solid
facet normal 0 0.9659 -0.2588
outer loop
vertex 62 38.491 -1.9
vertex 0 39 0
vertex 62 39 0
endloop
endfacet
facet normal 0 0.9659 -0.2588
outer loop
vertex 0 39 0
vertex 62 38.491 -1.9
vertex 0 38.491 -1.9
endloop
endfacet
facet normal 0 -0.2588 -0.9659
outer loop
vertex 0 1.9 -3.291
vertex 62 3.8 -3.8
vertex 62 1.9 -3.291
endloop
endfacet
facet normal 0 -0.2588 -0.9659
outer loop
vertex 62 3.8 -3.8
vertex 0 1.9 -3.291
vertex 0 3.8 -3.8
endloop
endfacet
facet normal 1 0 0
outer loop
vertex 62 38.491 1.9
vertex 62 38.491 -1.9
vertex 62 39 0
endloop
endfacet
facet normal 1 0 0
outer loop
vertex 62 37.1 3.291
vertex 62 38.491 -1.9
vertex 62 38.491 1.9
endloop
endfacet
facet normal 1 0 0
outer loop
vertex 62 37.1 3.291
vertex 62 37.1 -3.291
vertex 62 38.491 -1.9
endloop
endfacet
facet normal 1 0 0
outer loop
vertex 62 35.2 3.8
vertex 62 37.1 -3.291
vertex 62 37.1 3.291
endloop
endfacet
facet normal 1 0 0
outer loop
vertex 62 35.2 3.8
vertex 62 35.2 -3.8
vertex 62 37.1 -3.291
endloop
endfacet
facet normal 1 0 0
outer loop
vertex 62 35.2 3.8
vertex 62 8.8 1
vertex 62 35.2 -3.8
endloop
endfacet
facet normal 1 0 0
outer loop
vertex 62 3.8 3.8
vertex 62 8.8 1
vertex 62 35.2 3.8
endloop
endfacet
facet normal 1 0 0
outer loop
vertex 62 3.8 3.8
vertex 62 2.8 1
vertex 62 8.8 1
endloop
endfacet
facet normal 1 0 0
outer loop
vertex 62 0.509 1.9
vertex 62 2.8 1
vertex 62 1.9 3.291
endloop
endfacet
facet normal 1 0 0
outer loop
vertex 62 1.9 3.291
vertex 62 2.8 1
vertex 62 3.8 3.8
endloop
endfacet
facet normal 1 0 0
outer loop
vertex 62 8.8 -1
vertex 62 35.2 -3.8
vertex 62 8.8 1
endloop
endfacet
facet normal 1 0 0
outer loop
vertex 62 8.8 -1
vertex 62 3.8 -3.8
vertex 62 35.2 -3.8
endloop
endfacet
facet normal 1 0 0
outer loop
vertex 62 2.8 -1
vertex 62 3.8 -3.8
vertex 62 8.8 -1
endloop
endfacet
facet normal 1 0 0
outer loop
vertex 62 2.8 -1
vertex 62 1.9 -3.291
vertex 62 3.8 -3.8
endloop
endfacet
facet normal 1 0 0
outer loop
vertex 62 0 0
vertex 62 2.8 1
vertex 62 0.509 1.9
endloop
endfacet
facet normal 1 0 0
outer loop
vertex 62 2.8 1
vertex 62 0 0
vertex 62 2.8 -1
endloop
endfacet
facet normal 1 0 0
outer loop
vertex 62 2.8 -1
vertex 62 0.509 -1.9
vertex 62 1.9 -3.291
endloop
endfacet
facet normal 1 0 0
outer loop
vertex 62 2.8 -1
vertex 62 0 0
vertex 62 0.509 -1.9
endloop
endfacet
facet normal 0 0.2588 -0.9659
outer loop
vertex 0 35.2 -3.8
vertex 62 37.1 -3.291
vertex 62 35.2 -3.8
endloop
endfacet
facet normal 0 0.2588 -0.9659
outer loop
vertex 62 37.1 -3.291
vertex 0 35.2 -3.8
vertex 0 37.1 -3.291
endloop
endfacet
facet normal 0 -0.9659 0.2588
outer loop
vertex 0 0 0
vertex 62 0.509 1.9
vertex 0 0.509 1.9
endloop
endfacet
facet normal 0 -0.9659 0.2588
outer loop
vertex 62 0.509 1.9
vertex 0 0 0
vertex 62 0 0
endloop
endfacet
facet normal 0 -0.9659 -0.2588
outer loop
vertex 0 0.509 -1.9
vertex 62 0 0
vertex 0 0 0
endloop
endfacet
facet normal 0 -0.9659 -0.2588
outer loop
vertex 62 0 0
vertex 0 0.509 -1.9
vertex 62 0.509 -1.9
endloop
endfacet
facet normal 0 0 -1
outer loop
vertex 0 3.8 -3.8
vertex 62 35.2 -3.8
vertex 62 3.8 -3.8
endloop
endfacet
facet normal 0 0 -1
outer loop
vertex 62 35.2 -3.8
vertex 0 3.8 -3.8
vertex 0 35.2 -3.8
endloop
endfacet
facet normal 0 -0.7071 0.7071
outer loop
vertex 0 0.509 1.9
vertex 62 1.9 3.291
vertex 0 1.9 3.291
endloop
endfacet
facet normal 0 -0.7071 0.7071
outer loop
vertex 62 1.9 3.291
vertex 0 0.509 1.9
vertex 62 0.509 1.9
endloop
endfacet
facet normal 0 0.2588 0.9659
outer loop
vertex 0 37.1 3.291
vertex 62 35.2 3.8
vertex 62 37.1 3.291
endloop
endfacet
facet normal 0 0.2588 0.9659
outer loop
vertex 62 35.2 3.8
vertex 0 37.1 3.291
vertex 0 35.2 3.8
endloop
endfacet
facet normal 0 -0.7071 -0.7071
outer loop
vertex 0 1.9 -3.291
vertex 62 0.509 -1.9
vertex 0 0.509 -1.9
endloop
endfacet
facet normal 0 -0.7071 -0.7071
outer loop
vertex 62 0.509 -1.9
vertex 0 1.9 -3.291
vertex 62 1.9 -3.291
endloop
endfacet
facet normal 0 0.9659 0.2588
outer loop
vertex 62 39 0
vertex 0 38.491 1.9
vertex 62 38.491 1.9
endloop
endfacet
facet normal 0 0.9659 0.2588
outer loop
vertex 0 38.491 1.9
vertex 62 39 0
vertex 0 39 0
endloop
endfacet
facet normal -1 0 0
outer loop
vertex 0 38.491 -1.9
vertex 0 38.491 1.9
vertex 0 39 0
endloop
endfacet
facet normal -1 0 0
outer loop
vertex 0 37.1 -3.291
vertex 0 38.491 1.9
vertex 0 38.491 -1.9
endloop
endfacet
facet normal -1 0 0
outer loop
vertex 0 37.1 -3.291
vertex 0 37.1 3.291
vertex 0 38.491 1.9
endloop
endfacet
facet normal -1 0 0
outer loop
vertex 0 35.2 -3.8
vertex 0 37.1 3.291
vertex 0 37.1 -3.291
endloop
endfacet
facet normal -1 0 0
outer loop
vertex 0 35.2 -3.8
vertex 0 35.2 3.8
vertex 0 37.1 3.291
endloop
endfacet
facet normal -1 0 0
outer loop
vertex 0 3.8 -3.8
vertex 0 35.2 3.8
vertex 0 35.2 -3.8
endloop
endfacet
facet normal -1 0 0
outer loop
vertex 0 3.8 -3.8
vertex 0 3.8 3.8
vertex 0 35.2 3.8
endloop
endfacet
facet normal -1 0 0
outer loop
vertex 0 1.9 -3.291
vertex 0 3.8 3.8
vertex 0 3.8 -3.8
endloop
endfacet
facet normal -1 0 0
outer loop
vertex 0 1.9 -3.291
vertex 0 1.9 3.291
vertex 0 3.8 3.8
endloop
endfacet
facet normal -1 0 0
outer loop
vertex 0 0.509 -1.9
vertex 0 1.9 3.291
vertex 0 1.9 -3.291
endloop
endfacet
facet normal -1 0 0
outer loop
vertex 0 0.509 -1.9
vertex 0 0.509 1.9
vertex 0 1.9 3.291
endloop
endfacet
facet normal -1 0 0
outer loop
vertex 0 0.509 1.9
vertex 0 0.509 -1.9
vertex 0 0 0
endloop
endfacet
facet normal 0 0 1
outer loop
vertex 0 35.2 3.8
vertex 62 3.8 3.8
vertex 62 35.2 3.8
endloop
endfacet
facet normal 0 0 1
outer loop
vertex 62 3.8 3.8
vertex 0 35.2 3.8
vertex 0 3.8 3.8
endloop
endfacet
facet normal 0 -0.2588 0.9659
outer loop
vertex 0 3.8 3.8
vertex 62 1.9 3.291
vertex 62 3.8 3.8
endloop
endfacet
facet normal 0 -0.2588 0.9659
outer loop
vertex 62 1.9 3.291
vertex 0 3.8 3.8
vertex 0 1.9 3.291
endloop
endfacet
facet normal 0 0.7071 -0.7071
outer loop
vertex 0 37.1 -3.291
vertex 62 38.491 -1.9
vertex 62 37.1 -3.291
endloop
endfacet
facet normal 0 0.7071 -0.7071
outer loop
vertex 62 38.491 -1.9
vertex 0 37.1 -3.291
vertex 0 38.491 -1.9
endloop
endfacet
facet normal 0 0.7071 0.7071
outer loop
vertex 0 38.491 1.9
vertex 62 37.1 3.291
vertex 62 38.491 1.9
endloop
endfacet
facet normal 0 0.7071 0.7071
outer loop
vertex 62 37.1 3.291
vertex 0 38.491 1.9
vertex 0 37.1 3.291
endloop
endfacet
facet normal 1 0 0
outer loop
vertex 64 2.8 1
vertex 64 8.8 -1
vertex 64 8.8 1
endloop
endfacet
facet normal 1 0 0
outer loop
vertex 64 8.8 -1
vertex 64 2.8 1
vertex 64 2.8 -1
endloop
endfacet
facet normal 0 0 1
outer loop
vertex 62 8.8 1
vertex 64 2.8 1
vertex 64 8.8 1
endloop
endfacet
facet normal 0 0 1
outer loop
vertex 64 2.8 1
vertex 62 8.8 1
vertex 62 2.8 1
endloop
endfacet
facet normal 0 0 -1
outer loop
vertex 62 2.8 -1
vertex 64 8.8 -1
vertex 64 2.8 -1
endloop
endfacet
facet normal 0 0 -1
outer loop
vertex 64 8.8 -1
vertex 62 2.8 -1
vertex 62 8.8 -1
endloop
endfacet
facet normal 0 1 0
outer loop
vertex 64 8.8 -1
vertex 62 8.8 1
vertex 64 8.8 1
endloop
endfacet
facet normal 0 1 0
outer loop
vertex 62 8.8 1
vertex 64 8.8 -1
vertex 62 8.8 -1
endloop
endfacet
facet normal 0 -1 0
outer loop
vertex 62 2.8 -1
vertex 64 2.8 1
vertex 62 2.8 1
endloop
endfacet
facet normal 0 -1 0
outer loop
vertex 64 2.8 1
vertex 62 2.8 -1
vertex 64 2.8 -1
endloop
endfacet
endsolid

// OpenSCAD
W = 62;
H = 39;
T = 7.6;

module battery() {
  color("#566c86") hull() {
      translate([0, T / 2, 0])
        rotate(a=90, v=[0, 1, 0])
          cylinder(h=W, r=T / 2);
      translate([0, H - T / 2, 0])
        rotate(a=90, v=[0, 1, 0])
          cylinder(h=W, r=T / 2);
    }
  color("yellow")
    translate([W, T / 2 - 1, -1])
      cube([2, 6, 2]);
}

battery();
